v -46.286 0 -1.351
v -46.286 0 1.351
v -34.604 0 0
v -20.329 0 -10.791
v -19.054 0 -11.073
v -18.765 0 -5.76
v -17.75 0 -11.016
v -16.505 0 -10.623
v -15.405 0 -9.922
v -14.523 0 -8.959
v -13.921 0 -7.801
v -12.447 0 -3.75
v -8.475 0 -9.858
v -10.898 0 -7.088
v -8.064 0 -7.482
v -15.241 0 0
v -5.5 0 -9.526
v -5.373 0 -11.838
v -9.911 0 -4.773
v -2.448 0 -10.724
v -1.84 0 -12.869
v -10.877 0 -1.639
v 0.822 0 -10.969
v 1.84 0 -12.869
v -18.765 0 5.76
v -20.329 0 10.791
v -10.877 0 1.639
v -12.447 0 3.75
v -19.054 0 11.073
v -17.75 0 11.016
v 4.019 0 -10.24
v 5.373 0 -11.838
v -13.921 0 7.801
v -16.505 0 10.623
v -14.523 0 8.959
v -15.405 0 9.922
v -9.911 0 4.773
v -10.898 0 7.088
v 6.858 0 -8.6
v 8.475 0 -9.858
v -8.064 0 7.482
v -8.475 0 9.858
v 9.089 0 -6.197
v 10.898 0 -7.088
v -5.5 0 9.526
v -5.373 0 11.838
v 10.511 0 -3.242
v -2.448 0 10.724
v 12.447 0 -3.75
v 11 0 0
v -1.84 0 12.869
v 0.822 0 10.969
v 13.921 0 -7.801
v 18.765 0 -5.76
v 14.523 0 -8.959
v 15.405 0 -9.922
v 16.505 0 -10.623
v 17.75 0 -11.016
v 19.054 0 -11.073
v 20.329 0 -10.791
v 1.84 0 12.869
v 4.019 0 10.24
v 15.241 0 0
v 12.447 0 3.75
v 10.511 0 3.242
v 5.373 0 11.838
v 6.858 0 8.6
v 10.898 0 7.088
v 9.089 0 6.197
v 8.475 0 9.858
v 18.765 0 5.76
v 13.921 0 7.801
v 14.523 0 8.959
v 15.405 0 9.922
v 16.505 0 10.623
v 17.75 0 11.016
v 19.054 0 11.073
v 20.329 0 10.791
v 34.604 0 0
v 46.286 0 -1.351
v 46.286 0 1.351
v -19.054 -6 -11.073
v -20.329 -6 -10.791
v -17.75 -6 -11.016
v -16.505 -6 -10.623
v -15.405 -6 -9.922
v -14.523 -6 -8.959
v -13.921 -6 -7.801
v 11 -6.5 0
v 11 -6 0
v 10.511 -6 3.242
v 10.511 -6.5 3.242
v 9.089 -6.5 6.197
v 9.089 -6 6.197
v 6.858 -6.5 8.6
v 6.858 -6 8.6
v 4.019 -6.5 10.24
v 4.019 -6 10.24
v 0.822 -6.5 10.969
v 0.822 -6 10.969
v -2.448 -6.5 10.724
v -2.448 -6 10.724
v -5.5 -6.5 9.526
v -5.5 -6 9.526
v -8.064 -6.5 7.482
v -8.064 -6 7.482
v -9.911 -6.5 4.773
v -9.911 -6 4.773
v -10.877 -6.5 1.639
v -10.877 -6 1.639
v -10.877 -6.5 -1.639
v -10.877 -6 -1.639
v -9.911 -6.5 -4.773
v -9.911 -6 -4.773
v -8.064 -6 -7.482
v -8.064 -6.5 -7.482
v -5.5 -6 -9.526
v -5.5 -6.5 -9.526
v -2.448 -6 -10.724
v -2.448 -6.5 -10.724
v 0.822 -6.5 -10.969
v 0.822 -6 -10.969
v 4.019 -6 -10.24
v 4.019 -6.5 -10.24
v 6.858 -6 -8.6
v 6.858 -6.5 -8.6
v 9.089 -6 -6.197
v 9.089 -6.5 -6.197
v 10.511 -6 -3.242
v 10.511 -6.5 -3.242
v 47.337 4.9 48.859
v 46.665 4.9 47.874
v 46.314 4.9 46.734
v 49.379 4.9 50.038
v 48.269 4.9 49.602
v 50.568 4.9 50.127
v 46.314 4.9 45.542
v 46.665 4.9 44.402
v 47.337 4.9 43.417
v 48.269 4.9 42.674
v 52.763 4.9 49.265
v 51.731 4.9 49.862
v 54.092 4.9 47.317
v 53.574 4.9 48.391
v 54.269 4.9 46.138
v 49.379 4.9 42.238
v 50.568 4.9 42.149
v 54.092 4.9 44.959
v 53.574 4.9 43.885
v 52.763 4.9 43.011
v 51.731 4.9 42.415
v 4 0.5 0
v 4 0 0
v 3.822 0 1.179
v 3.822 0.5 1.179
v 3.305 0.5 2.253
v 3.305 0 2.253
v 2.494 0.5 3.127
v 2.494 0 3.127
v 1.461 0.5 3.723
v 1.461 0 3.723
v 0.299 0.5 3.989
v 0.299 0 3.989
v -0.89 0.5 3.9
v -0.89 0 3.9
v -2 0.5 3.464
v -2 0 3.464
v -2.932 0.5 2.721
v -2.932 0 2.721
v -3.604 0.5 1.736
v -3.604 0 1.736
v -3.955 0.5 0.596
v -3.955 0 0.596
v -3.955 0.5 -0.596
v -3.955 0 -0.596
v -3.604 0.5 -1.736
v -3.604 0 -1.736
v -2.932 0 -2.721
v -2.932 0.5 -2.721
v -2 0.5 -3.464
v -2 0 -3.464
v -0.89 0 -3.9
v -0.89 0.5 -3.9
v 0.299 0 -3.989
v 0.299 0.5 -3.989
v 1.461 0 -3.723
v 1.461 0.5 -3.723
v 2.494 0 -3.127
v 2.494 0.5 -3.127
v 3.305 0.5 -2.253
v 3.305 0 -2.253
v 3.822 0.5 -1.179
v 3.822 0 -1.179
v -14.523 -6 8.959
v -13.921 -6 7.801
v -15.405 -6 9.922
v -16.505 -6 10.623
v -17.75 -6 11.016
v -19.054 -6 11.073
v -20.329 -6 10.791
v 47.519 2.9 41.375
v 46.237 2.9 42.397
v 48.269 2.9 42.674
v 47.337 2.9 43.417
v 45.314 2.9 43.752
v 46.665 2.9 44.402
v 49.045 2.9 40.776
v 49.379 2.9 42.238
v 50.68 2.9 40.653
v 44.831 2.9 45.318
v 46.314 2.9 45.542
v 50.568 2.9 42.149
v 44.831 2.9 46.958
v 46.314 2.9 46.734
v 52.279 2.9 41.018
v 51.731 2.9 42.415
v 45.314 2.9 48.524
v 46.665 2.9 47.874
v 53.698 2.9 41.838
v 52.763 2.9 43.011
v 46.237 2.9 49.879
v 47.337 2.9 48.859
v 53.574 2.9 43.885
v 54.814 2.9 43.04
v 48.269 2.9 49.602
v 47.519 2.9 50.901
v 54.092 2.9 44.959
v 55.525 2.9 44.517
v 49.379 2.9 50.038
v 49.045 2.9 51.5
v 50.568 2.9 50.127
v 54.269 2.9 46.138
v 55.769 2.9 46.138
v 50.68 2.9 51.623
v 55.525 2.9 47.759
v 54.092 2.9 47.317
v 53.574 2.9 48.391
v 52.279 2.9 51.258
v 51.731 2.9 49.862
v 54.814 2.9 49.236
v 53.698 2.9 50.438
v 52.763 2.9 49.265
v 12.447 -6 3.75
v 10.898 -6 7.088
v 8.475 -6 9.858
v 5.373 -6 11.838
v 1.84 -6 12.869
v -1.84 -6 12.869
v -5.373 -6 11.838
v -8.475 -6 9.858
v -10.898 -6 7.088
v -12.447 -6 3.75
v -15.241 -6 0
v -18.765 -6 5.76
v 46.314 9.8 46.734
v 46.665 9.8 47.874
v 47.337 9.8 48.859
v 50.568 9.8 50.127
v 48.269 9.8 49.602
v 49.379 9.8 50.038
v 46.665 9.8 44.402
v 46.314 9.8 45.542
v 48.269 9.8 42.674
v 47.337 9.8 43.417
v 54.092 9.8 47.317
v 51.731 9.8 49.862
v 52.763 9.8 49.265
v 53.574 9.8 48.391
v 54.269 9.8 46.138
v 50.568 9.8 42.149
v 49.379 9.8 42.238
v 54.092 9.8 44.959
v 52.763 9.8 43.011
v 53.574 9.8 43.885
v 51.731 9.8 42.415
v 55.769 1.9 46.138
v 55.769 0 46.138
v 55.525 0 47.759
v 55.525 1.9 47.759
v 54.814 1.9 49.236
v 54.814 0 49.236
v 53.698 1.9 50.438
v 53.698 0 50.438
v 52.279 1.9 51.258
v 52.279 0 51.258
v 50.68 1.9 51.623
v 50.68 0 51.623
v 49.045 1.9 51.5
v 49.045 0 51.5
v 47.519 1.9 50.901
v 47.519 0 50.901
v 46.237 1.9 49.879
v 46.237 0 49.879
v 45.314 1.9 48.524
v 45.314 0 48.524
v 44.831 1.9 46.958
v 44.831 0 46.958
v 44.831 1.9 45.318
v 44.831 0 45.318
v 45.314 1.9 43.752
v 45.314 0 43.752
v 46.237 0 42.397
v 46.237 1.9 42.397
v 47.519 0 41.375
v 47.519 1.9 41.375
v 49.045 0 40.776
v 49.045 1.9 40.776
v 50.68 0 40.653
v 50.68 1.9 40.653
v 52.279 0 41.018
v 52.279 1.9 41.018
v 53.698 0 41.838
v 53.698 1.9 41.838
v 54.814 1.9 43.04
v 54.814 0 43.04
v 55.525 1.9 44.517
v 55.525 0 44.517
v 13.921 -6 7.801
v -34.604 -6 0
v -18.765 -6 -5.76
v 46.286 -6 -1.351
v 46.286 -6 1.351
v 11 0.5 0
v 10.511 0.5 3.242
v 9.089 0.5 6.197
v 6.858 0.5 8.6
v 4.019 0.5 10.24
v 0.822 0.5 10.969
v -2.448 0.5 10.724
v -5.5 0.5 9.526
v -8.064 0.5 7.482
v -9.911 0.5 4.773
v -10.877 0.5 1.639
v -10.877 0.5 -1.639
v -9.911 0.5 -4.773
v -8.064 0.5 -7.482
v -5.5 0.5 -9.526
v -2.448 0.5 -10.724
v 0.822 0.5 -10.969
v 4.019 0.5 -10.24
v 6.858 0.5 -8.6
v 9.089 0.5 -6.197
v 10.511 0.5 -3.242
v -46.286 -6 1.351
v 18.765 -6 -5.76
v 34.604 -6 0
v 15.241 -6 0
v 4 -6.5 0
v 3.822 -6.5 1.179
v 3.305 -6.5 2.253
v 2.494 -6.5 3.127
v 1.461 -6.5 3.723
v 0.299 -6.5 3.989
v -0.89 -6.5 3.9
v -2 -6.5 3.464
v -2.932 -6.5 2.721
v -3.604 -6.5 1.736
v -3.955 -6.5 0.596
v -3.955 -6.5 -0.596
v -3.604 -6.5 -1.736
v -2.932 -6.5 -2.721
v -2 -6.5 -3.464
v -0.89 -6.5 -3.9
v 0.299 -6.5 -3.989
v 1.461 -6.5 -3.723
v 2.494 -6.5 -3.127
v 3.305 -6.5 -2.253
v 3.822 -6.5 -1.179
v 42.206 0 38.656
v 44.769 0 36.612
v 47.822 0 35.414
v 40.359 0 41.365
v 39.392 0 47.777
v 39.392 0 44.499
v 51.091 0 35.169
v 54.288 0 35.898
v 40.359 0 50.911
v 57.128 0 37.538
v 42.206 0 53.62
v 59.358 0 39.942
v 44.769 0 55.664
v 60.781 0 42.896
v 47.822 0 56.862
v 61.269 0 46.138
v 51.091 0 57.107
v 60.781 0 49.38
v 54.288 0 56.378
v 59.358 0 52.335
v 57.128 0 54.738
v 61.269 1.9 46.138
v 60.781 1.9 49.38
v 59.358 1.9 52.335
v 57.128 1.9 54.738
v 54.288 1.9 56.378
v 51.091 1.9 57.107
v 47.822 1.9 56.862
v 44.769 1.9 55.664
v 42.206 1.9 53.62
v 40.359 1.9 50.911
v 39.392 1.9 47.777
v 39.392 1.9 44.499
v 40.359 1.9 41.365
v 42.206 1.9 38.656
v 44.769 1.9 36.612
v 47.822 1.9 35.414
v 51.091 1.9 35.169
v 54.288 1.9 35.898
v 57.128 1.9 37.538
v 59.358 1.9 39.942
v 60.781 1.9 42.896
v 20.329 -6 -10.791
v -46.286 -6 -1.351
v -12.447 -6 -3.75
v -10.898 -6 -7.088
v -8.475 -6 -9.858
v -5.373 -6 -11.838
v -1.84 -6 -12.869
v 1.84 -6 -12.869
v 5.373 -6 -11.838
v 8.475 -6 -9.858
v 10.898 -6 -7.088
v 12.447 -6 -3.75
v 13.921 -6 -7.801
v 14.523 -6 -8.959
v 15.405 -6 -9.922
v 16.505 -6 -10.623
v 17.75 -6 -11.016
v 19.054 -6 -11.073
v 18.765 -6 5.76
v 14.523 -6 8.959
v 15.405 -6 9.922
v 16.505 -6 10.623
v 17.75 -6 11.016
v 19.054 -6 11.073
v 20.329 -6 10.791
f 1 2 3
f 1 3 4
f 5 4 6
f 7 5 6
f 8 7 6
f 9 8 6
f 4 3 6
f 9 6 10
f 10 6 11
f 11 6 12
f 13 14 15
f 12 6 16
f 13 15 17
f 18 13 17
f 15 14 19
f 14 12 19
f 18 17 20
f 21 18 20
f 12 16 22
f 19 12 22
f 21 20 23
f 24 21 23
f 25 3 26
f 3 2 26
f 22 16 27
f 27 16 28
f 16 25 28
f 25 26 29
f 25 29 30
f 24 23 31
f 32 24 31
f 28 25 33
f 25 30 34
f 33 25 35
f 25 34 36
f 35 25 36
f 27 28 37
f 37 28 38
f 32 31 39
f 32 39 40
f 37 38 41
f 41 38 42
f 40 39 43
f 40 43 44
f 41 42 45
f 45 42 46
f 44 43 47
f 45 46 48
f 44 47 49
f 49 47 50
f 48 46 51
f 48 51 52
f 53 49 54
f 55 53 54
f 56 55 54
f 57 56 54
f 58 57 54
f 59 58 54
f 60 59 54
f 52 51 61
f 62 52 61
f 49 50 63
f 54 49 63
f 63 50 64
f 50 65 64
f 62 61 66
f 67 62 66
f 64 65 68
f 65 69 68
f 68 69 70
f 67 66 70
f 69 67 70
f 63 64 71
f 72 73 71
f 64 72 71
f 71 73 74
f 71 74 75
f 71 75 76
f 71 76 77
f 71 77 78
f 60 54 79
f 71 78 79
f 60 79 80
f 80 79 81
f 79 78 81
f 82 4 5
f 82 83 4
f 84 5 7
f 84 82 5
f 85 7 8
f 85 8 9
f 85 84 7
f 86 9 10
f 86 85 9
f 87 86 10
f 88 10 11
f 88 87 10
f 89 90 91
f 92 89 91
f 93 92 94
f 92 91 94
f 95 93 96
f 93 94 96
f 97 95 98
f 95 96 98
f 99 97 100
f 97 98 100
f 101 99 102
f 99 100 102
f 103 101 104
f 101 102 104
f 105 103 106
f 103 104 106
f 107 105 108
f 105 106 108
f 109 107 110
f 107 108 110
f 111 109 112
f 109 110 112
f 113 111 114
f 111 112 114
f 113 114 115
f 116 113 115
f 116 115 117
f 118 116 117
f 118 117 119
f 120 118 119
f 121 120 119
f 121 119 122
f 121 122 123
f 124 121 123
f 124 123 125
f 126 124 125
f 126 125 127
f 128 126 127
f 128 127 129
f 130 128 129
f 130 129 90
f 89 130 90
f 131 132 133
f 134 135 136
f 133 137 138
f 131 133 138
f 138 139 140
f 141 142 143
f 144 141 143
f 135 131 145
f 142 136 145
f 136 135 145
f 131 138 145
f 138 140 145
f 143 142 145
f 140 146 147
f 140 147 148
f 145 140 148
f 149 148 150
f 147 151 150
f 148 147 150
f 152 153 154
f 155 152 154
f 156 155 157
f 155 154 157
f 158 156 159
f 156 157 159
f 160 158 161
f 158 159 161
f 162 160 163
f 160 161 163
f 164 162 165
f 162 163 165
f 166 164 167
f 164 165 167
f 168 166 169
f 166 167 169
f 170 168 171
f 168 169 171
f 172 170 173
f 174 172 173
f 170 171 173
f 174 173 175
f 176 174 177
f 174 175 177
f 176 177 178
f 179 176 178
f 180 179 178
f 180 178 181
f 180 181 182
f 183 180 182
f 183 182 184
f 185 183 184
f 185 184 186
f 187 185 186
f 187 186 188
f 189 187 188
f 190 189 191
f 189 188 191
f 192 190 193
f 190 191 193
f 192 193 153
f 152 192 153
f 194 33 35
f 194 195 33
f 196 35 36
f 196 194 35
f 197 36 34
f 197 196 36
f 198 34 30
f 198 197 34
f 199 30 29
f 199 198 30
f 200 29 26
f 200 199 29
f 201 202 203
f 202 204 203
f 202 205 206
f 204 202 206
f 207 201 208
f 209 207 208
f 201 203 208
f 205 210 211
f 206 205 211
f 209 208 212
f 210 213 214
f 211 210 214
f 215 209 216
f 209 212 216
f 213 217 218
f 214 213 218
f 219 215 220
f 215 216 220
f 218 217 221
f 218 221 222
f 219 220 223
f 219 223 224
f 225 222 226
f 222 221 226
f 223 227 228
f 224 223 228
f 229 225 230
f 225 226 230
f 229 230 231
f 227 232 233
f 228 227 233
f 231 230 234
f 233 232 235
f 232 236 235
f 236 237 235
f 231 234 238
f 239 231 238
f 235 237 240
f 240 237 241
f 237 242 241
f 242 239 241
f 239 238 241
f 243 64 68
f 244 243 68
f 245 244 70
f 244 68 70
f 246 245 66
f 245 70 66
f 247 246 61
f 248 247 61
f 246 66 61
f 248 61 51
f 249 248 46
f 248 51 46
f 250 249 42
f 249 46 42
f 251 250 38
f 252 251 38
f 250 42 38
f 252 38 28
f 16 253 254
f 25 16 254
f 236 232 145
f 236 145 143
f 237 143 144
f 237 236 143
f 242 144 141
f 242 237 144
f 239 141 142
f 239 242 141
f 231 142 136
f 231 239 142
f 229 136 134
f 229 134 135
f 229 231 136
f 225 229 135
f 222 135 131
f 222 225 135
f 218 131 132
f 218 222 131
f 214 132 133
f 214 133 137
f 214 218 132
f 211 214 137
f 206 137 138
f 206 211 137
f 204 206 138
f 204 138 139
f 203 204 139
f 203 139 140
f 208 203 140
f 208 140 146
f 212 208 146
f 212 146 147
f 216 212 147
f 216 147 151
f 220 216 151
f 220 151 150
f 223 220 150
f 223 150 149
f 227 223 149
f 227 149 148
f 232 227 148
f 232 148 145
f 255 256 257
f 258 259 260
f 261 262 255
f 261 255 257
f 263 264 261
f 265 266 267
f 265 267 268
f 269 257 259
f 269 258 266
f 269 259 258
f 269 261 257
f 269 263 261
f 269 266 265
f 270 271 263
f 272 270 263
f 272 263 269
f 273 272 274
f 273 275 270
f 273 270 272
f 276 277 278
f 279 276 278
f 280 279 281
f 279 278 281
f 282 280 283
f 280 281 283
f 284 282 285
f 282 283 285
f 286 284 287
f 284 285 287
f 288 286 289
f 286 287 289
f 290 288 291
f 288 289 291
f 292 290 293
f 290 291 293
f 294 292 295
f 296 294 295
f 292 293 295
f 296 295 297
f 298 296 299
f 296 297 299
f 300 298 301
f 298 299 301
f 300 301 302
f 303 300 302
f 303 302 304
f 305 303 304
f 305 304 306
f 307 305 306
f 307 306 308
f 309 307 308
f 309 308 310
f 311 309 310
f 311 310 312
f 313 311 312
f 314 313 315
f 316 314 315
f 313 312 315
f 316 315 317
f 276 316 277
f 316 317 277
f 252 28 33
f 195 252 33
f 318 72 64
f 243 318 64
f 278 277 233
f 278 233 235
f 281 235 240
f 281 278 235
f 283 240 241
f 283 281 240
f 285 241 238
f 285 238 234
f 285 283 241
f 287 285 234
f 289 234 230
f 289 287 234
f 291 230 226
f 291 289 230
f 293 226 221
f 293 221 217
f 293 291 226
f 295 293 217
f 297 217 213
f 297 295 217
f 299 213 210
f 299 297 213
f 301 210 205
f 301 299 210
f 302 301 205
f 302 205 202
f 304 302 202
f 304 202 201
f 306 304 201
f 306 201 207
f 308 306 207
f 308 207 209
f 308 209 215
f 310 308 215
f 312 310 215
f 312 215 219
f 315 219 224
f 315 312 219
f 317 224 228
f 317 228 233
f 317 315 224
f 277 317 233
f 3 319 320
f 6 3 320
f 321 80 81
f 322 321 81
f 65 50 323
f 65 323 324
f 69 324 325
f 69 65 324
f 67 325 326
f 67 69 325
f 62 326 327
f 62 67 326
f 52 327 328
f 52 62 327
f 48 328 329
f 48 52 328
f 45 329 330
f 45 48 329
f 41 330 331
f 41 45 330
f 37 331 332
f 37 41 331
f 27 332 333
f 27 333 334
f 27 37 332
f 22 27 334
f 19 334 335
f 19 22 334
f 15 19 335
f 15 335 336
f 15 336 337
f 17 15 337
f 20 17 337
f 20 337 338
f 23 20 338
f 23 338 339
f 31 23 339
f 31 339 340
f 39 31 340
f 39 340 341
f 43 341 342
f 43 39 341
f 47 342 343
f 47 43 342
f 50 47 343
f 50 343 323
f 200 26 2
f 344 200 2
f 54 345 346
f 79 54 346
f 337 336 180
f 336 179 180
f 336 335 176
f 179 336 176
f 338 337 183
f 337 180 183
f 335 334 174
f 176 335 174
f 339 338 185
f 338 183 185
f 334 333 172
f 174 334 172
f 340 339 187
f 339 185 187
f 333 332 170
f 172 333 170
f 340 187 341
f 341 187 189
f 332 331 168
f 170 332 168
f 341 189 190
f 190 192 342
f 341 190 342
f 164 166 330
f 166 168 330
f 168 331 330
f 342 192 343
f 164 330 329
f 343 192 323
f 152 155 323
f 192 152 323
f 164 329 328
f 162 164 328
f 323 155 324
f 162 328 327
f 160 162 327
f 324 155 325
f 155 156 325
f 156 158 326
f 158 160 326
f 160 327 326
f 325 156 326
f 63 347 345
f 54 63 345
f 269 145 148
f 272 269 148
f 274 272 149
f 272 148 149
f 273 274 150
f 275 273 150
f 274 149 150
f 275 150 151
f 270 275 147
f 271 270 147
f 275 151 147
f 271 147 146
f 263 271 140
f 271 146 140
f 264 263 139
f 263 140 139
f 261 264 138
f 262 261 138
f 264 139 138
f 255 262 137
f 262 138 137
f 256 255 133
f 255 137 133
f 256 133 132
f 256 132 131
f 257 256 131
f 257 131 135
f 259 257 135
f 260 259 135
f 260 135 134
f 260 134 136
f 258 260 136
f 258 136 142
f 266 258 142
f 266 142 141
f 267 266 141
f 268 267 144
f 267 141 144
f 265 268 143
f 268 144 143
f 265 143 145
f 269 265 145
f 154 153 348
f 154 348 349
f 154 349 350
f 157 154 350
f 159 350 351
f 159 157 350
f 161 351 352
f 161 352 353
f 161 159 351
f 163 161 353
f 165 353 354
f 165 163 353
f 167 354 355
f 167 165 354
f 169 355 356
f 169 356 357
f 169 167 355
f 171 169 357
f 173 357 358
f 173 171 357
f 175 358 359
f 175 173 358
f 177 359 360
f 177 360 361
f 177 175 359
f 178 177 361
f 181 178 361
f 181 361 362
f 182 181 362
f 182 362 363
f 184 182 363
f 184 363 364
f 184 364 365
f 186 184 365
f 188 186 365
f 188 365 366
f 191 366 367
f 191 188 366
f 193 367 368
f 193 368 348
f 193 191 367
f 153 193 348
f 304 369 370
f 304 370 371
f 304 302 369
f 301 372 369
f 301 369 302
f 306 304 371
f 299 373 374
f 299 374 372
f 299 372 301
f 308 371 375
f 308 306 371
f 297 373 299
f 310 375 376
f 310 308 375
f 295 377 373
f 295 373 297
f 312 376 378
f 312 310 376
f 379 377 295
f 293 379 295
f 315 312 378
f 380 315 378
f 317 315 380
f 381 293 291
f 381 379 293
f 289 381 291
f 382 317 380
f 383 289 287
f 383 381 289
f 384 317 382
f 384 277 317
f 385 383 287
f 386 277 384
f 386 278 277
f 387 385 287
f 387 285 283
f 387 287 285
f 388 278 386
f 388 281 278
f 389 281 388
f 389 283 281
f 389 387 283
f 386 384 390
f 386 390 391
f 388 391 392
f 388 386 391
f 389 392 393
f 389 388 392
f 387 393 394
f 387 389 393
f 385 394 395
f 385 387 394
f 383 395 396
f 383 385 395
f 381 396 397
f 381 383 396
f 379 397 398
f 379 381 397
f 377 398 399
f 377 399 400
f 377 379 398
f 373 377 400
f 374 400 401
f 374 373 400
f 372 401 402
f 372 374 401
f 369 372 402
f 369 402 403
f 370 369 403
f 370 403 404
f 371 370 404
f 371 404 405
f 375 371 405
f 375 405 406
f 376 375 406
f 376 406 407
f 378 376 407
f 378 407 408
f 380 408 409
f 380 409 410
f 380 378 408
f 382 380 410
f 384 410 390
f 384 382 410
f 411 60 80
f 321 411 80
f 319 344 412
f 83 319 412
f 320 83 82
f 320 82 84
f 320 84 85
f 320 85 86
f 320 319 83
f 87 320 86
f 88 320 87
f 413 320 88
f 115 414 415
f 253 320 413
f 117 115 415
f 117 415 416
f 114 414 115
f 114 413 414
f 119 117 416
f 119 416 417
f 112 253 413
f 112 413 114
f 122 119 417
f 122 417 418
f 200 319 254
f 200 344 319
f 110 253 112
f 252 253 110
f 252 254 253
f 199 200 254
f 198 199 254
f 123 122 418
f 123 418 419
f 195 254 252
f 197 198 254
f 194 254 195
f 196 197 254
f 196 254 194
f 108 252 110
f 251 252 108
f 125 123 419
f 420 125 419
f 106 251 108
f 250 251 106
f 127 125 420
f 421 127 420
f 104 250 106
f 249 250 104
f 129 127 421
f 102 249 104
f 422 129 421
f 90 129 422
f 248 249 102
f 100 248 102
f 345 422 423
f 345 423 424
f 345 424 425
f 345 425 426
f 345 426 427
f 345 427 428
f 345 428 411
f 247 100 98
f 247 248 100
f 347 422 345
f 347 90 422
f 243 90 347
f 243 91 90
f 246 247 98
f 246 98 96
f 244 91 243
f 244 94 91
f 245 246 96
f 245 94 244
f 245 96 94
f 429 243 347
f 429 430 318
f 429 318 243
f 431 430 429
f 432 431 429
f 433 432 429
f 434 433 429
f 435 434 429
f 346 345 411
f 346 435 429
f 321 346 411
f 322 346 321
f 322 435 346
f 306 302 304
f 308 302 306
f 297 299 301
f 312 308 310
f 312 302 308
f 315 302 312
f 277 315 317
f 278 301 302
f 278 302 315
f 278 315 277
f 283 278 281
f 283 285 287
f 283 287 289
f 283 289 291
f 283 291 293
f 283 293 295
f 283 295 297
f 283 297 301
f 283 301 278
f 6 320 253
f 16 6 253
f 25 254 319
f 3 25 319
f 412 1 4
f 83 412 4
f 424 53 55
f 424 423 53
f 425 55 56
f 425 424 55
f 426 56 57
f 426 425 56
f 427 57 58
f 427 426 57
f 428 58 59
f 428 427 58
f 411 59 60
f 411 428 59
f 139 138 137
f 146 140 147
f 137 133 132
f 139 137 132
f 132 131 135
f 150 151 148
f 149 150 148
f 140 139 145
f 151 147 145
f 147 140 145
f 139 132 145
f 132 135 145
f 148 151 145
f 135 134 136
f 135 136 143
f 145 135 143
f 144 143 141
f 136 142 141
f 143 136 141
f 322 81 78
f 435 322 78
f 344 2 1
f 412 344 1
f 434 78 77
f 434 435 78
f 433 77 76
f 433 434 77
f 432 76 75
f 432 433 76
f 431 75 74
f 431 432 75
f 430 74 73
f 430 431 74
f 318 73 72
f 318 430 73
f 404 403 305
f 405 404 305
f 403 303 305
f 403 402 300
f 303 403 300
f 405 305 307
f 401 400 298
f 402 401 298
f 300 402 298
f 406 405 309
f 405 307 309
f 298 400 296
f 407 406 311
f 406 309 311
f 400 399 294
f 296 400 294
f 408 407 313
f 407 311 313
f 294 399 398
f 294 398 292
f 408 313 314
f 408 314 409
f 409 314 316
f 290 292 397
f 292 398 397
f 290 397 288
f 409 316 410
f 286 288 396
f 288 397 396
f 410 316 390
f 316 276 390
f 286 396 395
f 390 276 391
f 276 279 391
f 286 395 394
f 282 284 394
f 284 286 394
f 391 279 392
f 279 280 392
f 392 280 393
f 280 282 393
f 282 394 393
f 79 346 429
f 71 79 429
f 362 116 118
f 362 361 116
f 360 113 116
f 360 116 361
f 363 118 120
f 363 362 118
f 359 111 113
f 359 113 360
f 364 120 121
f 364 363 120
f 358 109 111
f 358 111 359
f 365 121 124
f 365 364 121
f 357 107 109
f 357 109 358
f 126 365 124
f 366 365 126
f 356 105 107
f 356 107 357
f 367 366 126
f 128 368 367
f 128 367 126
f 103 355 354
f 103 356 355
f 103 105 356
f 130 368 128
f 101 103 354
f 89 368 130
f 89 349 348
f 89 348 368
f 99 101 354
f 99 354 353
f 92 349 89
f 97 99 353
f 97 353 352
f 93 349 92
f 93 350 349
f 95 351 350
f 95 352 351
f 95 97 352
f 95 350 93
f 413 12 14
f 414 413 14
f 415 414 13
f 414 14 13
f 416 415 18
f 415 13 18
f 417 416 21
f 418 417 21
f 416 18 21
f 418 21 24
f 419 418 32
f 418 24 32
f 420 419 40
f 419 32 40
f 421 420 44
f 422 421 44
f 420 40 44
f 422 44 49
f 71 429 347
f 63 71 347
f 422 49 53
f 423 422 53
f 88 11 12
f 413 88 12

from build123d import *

# Parameters (mm, degrees)
F0_R       = 11
F1_DEPTH   = 6
F2_R       = 5
F5_DEPTH   = 25
F0_R_2     = 9.5
F0_R_3     = 5.1
F0_R_4     = 4
F7_R       = 5.1
F7_R_2     = 4
F8_DEPTH   = 6.5
F9_DEPTH   = 0.5
F6_R       = 4
F11_DEPTH  = 4.9
F11_FACE_R = 4
F12_DEPTH  = 4.9
F10_R      = 5.5
F13_DEPTH  = 2.9
F10_R_2    = 11
F14_DEPTH  = 1.9


with BuildPart() as f1:
    # F0 (on Front) → F1 (new body)
    with BuildSketch(Plane.XZ):
        with BuildLine():
            ThreePointArc((12.447389, 3.75), (12.861105, 1.895249), (13, 0))
            ThreePointArc((13, 0), (12.861105, -1.895249), (12.447389, -3.75))
            Line((12.447389, -3.75), (15.629637, -12.5))
            Line((15.629637, -12.5), (46.286209, -1.350651))
            Line((46.286209, -1.350651), (46.286209, 1.350651))
            Line((46.286209, 1.350651), (15.629637, 12.5))
            Line((15.629637, 12.5), (12.447389, 3.75))
        make_face()
        with BuildLine():
            ThreePointArc((12.447389, -3.75), (12.861105, -1.895249), (13, 0))
            ThreePointArc((13, 0), (12.861105, 1.895249), (12.447389, 3.75))
            ThreePointArc((12.447389, 3.75), (0, 13), (-12.447389, 3.75))
            ThreePointArc((-12.447389, 3.75), (-13, 0), (-12.447389, -3.75))
            ThreePointArc((-12.447389, -3.75), (0, -13), (12.447389, -3.75))
        make_face()
        Circle(F0_R, mode=Mode.SUBTRACT)
        with BuildLine():
            ThreePointArc((-12.447389, -3.75), (-13, 0), (-12.447389, 3.75))
            Line((-12.447389, 3.75), (-15.629637, 12.5))
            Line((-15.629637, 12.5), (-46.286209, 1.350651))
            Line((-46.286209, 1.350651), (-46.286209, -1.350651))
            Line((-46.286209, -1.350651), (-15.629637, -12.5))
            Line((-15.629637, -12.5), (-12.447389, -3.75))
        make_face()
    extrude(amount=F1_DEPTH)

    # F2
    f2_edges = [f1.edges().sort_by_distance(p)[0] for p in [
        (15.629637, -3, 12.5),
        (15.629637, -3, -12.5),
        (-15.629637, -3, -12.5),
        (-15.629637, -3, 12.5),
    ]]
    fillet(f2_edges, radius=F2_R)

    # F3 (on face) + F4 (on face) → F5 (cut)
    with BuildSketch(Plane.XZ.offset(6)):
        Polygon((34.603786, 0), (18.765277, 5.760235), (15.240615, 0), (18.765277, -5.760235), align=None)
    with BuildSketch(Plane.XZ.offset(6)):
        Polygon((-18.765277, -5.760235), (-15.240615, 0), (-18.765277, 5.760235), (-34.603786, 0), align=None)
    extrude(amount=-F5_DEPTH, mode=Mode.SUBTRACT)

    # F0 (on Front) + F7 (on Front) → F8 (join)
    with BuildSketch(Plane.XZ):
        Circle(F0_R)
        Circle(F0_R_2, mode=Mode.SUBTRACT)
        Circle(F0_R_2)
        Circle(F0_R_3, mode=Mode.SUBTRACT)
        Circle(F0_R_3)
        Circle(F0_R_4, mode=Mode.SUBTRACT)
    with BuildSketch(Plane.XZ):
        Circle(F7_R)
        Circle(F7_R_2, mode=Mode.SUBTRACT)
    extrude(amount=F8_DEPTH)

    # F0 (on Front) → F9 (join)
    with BuildSketch(Plane.XZ):
        Circle(F0_R)
        Circle(F0_R_2, mode=Mode.SUBTRACT)
        Circle(F0_R_2)
        Circle(F0_R_3, mode=Mode.SUBTRACT)
        Circle(F0_R_3)
        Circle(F0_R_4, mode=Mode.SUBTRACT)
    extrude(amount=-F9_DEPTH)


with BuildPart() as f11:
    # F6 (on Front) → F11 (new body)
    with BuildSketch(Plane.XZ):
        with Locations((50.269235, 46.13803)):
            Circle(F6_R)
    extrude(amount=-F11_DEPTH)

    # F10 (on Front) → F13 (join)
    with BuildSketch(Plane.XZ):
        with Locations((50.269235, 46.13803)):
            Circle(F10_R)
    extrude(amount=-F13_DEPTH)


with BuildPart() as f12:
    # F11_face (on face) → F12 (new body)
    with BuildSketch(Plane(origin=(50.269235, 4.9, 46.13803), x_dir=(1, 0, 0), z_dir=(0, 1, 0))):
        Circle(F11_FACE_R)
    extrude(amount=F12_DEPTH)


with BuildPart() as f14:
    # F10 (on Front) → F14 (new body)
    with BuildSketch(Plane.XZ):
        with Locations((50.269235, 46.13803)):
            Circle(F10_R_2)
        with Locations((50.269235, 46.13803)):
            Circle(F10_R, mode=Mode.SUBTRACT)
    extrude(amount=-F14_DEPTH)


solid = Compound([f1.part, f11.part, f12.part, f14.part])
